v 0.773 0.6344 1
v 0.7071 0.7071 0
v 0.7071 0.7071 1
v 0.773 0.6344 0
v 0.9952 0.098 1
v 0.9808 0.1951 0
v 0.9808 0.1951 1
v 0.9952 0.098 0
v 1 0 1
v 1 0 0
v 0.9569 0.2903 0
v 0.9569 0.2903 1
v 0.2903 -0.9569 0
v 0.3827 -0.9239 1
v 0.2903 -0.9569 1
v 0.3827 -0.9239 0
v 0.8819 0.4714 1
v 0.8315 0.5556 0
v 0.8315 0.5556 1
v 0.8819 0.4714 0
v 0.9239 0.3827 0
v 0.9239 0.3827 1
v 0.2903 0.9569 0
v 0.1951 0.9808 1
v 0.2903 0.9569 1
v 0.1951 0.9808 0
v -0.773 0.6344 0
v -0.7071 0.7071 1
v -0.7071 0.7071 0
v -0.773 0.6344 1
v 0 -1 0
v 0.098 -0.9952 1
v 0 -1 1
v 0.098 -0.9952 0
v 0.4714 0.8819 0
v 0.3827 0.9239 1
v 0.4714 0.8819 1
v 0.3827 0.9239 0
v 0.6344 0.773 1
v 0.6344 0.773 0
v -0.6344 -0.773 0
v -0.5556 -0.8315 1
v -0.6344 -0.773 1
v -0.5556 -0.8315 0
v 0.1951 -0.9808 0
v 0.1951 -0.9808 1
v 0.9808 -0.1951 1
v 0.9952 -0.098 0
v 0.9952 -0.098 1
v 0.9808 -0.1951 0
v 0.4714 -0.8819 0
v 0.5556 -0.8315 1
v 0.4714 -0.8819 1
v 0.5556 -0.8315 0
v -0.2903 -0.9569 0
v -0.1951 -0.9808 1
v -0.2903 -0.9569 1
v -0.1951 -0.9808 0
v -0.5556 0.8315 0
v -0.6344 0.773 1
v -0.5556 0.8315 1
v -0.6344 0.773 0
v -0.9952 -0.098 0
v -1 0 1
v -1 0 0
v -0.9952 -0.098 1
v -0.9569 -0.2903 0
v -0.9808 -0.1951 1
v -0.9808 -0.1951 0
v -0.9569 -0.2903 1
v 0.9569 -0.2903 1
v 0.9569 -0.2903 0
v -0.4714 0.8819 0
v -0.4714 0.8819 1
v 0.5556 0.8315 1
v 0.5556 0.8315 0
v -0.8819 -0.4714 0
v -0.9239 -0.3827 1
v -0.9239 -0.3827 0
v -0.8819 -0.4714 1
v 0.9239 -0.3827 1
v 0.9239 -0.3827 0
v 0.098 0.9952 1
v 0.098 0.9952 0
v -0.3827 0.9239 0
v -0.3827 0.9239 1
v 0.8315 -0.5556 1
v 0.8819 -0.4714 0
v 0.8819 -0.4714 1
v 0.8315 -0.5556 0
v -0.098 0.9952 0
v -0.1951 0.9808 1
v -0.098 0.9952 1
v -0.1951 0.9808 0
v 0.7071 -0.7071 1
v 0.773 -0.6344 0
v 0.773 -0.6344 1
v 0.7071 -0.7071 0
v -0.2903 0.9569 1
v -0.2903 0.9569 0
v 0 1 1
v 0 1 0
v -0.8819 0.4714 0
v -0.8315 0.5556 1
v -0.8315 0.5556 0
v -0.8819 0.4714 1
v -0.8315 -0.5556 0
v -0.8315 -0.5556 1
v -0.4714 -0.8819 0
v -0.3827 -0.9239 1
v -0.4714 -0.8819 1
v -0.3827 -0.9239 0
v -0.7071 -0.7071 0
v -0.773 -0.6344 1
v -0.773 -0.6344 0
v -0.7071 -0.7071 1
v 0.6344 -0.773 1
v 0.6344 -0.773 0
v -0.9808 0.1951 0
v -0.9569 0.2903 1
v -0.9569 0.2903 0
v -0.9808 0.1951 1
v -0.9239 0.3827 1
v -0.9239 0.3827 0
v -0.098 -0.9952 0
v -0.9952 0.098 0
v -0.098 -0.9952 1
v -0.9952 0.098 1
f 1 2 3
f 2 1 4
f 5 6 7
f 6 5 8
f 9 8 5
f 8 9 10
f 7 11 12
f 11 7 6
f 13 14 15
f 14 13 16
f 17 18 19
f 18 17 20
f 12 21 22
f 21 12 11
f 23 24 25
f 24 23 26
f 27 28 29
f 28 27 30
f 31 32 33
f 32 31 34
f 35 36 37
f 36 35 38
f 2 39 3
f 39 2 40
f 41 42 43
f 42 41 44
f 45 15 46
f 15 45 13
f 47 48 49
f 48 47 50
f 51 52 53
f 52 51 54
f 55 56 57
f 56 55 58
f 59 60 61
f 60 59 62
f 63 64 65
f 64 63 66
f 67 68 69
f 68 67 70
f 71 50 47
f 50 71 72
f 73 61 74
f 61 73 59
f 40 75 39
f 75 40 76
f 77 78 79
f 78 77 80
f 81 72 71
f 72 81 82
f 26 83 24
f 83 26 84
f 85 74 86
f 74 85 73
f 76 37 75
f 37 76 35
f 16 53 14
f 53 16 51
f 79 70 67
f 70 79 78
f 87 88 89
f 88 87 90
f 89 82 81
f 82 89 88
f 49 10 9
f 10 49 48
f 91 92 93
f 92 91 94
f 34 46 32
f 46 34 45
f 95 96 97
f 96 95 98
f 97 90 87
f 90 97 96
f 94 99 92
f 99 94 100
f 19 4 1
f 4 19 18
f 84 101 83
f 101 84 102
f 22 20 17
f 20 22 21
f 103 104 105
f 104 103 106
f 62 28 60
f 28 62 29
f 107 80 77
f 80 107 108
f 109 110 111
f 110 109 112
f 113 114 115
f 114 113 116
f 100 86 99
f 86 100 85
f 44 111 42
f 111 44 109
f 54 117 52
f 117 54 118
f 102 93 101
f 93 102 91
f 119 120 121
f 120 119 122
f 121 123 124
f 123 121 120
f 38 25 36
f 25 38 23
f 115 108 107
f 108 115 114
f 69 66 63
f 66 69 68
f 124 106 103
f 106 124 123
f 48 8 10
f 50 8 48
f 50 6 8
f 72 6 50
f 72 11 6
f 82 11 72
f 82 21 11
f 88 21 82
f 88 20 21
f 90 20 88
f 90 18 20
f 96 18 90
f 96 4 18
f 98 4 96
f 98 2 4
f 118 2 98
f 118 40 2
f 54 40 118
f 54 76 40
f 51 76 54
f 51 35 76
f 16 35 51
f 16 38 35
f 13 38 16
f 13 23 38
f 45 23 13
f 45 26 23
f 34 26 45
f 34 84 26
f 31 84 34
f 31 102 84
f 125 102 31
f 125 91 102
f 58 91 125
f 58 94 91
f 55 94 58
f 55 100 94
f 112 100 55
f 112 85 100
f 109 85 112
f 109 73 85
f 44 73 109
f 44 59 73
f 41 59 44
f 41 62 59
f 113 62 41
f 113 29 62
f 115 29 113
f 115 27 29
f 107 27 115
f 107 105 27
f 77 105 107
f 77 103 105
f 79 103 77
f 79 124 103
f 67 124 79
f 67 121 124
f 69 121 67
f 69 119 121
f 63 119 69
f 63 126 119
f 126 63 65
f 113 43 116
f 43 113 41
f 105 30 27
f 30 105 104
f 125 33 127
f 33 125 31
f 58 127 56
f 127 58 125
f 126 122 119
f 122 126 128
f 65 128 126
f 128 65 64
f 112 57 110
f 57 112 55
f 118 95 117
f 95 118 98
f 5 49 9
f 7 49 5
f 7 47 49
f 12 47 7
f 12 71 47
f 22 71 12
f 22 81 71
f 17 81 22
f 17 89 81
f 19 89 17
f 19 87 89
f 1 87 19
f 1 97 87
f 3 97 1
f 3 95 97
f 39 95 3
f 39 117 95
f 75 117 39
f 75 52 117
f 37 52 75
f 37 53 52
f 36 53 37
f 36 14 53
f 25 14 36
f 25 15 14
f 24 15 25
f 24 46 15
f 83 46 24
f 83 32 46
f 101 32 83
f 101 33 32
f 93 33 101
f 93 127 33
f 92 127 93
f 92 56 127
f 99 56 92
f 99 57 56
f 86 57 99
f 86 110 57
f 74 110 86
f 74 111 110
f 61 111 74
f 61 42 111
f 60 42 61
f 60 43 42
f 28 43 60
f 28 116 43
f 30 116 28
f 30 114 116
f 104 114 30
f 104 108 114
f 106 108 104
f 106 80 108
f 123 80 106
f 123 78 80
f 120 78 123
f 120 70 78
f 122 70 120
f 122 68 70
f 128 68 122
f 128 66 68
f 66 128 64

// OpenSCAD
/**
 * articulationAxisSubPiece
 * @name articulationAxisSubPiece
 * @description articlulation axis
 * @type subPiece
 */
module articulationAxisSubPiece(
    base_diameter,
    base_height,
    axis_diameter,
    axis_height,
    _fn = 64
) {
    cylinder(
        r = base_diameter / 2,
        h = base_height,
        $fn = _fn
    );
    translate(
        [
            0,
            0,
            base_height
        ]
    )
        cylinder(
            r = axis_diameter / 2,
            h = axis_height,
            $fn = _fn
        );

}

articulationAxisSubPiece();
